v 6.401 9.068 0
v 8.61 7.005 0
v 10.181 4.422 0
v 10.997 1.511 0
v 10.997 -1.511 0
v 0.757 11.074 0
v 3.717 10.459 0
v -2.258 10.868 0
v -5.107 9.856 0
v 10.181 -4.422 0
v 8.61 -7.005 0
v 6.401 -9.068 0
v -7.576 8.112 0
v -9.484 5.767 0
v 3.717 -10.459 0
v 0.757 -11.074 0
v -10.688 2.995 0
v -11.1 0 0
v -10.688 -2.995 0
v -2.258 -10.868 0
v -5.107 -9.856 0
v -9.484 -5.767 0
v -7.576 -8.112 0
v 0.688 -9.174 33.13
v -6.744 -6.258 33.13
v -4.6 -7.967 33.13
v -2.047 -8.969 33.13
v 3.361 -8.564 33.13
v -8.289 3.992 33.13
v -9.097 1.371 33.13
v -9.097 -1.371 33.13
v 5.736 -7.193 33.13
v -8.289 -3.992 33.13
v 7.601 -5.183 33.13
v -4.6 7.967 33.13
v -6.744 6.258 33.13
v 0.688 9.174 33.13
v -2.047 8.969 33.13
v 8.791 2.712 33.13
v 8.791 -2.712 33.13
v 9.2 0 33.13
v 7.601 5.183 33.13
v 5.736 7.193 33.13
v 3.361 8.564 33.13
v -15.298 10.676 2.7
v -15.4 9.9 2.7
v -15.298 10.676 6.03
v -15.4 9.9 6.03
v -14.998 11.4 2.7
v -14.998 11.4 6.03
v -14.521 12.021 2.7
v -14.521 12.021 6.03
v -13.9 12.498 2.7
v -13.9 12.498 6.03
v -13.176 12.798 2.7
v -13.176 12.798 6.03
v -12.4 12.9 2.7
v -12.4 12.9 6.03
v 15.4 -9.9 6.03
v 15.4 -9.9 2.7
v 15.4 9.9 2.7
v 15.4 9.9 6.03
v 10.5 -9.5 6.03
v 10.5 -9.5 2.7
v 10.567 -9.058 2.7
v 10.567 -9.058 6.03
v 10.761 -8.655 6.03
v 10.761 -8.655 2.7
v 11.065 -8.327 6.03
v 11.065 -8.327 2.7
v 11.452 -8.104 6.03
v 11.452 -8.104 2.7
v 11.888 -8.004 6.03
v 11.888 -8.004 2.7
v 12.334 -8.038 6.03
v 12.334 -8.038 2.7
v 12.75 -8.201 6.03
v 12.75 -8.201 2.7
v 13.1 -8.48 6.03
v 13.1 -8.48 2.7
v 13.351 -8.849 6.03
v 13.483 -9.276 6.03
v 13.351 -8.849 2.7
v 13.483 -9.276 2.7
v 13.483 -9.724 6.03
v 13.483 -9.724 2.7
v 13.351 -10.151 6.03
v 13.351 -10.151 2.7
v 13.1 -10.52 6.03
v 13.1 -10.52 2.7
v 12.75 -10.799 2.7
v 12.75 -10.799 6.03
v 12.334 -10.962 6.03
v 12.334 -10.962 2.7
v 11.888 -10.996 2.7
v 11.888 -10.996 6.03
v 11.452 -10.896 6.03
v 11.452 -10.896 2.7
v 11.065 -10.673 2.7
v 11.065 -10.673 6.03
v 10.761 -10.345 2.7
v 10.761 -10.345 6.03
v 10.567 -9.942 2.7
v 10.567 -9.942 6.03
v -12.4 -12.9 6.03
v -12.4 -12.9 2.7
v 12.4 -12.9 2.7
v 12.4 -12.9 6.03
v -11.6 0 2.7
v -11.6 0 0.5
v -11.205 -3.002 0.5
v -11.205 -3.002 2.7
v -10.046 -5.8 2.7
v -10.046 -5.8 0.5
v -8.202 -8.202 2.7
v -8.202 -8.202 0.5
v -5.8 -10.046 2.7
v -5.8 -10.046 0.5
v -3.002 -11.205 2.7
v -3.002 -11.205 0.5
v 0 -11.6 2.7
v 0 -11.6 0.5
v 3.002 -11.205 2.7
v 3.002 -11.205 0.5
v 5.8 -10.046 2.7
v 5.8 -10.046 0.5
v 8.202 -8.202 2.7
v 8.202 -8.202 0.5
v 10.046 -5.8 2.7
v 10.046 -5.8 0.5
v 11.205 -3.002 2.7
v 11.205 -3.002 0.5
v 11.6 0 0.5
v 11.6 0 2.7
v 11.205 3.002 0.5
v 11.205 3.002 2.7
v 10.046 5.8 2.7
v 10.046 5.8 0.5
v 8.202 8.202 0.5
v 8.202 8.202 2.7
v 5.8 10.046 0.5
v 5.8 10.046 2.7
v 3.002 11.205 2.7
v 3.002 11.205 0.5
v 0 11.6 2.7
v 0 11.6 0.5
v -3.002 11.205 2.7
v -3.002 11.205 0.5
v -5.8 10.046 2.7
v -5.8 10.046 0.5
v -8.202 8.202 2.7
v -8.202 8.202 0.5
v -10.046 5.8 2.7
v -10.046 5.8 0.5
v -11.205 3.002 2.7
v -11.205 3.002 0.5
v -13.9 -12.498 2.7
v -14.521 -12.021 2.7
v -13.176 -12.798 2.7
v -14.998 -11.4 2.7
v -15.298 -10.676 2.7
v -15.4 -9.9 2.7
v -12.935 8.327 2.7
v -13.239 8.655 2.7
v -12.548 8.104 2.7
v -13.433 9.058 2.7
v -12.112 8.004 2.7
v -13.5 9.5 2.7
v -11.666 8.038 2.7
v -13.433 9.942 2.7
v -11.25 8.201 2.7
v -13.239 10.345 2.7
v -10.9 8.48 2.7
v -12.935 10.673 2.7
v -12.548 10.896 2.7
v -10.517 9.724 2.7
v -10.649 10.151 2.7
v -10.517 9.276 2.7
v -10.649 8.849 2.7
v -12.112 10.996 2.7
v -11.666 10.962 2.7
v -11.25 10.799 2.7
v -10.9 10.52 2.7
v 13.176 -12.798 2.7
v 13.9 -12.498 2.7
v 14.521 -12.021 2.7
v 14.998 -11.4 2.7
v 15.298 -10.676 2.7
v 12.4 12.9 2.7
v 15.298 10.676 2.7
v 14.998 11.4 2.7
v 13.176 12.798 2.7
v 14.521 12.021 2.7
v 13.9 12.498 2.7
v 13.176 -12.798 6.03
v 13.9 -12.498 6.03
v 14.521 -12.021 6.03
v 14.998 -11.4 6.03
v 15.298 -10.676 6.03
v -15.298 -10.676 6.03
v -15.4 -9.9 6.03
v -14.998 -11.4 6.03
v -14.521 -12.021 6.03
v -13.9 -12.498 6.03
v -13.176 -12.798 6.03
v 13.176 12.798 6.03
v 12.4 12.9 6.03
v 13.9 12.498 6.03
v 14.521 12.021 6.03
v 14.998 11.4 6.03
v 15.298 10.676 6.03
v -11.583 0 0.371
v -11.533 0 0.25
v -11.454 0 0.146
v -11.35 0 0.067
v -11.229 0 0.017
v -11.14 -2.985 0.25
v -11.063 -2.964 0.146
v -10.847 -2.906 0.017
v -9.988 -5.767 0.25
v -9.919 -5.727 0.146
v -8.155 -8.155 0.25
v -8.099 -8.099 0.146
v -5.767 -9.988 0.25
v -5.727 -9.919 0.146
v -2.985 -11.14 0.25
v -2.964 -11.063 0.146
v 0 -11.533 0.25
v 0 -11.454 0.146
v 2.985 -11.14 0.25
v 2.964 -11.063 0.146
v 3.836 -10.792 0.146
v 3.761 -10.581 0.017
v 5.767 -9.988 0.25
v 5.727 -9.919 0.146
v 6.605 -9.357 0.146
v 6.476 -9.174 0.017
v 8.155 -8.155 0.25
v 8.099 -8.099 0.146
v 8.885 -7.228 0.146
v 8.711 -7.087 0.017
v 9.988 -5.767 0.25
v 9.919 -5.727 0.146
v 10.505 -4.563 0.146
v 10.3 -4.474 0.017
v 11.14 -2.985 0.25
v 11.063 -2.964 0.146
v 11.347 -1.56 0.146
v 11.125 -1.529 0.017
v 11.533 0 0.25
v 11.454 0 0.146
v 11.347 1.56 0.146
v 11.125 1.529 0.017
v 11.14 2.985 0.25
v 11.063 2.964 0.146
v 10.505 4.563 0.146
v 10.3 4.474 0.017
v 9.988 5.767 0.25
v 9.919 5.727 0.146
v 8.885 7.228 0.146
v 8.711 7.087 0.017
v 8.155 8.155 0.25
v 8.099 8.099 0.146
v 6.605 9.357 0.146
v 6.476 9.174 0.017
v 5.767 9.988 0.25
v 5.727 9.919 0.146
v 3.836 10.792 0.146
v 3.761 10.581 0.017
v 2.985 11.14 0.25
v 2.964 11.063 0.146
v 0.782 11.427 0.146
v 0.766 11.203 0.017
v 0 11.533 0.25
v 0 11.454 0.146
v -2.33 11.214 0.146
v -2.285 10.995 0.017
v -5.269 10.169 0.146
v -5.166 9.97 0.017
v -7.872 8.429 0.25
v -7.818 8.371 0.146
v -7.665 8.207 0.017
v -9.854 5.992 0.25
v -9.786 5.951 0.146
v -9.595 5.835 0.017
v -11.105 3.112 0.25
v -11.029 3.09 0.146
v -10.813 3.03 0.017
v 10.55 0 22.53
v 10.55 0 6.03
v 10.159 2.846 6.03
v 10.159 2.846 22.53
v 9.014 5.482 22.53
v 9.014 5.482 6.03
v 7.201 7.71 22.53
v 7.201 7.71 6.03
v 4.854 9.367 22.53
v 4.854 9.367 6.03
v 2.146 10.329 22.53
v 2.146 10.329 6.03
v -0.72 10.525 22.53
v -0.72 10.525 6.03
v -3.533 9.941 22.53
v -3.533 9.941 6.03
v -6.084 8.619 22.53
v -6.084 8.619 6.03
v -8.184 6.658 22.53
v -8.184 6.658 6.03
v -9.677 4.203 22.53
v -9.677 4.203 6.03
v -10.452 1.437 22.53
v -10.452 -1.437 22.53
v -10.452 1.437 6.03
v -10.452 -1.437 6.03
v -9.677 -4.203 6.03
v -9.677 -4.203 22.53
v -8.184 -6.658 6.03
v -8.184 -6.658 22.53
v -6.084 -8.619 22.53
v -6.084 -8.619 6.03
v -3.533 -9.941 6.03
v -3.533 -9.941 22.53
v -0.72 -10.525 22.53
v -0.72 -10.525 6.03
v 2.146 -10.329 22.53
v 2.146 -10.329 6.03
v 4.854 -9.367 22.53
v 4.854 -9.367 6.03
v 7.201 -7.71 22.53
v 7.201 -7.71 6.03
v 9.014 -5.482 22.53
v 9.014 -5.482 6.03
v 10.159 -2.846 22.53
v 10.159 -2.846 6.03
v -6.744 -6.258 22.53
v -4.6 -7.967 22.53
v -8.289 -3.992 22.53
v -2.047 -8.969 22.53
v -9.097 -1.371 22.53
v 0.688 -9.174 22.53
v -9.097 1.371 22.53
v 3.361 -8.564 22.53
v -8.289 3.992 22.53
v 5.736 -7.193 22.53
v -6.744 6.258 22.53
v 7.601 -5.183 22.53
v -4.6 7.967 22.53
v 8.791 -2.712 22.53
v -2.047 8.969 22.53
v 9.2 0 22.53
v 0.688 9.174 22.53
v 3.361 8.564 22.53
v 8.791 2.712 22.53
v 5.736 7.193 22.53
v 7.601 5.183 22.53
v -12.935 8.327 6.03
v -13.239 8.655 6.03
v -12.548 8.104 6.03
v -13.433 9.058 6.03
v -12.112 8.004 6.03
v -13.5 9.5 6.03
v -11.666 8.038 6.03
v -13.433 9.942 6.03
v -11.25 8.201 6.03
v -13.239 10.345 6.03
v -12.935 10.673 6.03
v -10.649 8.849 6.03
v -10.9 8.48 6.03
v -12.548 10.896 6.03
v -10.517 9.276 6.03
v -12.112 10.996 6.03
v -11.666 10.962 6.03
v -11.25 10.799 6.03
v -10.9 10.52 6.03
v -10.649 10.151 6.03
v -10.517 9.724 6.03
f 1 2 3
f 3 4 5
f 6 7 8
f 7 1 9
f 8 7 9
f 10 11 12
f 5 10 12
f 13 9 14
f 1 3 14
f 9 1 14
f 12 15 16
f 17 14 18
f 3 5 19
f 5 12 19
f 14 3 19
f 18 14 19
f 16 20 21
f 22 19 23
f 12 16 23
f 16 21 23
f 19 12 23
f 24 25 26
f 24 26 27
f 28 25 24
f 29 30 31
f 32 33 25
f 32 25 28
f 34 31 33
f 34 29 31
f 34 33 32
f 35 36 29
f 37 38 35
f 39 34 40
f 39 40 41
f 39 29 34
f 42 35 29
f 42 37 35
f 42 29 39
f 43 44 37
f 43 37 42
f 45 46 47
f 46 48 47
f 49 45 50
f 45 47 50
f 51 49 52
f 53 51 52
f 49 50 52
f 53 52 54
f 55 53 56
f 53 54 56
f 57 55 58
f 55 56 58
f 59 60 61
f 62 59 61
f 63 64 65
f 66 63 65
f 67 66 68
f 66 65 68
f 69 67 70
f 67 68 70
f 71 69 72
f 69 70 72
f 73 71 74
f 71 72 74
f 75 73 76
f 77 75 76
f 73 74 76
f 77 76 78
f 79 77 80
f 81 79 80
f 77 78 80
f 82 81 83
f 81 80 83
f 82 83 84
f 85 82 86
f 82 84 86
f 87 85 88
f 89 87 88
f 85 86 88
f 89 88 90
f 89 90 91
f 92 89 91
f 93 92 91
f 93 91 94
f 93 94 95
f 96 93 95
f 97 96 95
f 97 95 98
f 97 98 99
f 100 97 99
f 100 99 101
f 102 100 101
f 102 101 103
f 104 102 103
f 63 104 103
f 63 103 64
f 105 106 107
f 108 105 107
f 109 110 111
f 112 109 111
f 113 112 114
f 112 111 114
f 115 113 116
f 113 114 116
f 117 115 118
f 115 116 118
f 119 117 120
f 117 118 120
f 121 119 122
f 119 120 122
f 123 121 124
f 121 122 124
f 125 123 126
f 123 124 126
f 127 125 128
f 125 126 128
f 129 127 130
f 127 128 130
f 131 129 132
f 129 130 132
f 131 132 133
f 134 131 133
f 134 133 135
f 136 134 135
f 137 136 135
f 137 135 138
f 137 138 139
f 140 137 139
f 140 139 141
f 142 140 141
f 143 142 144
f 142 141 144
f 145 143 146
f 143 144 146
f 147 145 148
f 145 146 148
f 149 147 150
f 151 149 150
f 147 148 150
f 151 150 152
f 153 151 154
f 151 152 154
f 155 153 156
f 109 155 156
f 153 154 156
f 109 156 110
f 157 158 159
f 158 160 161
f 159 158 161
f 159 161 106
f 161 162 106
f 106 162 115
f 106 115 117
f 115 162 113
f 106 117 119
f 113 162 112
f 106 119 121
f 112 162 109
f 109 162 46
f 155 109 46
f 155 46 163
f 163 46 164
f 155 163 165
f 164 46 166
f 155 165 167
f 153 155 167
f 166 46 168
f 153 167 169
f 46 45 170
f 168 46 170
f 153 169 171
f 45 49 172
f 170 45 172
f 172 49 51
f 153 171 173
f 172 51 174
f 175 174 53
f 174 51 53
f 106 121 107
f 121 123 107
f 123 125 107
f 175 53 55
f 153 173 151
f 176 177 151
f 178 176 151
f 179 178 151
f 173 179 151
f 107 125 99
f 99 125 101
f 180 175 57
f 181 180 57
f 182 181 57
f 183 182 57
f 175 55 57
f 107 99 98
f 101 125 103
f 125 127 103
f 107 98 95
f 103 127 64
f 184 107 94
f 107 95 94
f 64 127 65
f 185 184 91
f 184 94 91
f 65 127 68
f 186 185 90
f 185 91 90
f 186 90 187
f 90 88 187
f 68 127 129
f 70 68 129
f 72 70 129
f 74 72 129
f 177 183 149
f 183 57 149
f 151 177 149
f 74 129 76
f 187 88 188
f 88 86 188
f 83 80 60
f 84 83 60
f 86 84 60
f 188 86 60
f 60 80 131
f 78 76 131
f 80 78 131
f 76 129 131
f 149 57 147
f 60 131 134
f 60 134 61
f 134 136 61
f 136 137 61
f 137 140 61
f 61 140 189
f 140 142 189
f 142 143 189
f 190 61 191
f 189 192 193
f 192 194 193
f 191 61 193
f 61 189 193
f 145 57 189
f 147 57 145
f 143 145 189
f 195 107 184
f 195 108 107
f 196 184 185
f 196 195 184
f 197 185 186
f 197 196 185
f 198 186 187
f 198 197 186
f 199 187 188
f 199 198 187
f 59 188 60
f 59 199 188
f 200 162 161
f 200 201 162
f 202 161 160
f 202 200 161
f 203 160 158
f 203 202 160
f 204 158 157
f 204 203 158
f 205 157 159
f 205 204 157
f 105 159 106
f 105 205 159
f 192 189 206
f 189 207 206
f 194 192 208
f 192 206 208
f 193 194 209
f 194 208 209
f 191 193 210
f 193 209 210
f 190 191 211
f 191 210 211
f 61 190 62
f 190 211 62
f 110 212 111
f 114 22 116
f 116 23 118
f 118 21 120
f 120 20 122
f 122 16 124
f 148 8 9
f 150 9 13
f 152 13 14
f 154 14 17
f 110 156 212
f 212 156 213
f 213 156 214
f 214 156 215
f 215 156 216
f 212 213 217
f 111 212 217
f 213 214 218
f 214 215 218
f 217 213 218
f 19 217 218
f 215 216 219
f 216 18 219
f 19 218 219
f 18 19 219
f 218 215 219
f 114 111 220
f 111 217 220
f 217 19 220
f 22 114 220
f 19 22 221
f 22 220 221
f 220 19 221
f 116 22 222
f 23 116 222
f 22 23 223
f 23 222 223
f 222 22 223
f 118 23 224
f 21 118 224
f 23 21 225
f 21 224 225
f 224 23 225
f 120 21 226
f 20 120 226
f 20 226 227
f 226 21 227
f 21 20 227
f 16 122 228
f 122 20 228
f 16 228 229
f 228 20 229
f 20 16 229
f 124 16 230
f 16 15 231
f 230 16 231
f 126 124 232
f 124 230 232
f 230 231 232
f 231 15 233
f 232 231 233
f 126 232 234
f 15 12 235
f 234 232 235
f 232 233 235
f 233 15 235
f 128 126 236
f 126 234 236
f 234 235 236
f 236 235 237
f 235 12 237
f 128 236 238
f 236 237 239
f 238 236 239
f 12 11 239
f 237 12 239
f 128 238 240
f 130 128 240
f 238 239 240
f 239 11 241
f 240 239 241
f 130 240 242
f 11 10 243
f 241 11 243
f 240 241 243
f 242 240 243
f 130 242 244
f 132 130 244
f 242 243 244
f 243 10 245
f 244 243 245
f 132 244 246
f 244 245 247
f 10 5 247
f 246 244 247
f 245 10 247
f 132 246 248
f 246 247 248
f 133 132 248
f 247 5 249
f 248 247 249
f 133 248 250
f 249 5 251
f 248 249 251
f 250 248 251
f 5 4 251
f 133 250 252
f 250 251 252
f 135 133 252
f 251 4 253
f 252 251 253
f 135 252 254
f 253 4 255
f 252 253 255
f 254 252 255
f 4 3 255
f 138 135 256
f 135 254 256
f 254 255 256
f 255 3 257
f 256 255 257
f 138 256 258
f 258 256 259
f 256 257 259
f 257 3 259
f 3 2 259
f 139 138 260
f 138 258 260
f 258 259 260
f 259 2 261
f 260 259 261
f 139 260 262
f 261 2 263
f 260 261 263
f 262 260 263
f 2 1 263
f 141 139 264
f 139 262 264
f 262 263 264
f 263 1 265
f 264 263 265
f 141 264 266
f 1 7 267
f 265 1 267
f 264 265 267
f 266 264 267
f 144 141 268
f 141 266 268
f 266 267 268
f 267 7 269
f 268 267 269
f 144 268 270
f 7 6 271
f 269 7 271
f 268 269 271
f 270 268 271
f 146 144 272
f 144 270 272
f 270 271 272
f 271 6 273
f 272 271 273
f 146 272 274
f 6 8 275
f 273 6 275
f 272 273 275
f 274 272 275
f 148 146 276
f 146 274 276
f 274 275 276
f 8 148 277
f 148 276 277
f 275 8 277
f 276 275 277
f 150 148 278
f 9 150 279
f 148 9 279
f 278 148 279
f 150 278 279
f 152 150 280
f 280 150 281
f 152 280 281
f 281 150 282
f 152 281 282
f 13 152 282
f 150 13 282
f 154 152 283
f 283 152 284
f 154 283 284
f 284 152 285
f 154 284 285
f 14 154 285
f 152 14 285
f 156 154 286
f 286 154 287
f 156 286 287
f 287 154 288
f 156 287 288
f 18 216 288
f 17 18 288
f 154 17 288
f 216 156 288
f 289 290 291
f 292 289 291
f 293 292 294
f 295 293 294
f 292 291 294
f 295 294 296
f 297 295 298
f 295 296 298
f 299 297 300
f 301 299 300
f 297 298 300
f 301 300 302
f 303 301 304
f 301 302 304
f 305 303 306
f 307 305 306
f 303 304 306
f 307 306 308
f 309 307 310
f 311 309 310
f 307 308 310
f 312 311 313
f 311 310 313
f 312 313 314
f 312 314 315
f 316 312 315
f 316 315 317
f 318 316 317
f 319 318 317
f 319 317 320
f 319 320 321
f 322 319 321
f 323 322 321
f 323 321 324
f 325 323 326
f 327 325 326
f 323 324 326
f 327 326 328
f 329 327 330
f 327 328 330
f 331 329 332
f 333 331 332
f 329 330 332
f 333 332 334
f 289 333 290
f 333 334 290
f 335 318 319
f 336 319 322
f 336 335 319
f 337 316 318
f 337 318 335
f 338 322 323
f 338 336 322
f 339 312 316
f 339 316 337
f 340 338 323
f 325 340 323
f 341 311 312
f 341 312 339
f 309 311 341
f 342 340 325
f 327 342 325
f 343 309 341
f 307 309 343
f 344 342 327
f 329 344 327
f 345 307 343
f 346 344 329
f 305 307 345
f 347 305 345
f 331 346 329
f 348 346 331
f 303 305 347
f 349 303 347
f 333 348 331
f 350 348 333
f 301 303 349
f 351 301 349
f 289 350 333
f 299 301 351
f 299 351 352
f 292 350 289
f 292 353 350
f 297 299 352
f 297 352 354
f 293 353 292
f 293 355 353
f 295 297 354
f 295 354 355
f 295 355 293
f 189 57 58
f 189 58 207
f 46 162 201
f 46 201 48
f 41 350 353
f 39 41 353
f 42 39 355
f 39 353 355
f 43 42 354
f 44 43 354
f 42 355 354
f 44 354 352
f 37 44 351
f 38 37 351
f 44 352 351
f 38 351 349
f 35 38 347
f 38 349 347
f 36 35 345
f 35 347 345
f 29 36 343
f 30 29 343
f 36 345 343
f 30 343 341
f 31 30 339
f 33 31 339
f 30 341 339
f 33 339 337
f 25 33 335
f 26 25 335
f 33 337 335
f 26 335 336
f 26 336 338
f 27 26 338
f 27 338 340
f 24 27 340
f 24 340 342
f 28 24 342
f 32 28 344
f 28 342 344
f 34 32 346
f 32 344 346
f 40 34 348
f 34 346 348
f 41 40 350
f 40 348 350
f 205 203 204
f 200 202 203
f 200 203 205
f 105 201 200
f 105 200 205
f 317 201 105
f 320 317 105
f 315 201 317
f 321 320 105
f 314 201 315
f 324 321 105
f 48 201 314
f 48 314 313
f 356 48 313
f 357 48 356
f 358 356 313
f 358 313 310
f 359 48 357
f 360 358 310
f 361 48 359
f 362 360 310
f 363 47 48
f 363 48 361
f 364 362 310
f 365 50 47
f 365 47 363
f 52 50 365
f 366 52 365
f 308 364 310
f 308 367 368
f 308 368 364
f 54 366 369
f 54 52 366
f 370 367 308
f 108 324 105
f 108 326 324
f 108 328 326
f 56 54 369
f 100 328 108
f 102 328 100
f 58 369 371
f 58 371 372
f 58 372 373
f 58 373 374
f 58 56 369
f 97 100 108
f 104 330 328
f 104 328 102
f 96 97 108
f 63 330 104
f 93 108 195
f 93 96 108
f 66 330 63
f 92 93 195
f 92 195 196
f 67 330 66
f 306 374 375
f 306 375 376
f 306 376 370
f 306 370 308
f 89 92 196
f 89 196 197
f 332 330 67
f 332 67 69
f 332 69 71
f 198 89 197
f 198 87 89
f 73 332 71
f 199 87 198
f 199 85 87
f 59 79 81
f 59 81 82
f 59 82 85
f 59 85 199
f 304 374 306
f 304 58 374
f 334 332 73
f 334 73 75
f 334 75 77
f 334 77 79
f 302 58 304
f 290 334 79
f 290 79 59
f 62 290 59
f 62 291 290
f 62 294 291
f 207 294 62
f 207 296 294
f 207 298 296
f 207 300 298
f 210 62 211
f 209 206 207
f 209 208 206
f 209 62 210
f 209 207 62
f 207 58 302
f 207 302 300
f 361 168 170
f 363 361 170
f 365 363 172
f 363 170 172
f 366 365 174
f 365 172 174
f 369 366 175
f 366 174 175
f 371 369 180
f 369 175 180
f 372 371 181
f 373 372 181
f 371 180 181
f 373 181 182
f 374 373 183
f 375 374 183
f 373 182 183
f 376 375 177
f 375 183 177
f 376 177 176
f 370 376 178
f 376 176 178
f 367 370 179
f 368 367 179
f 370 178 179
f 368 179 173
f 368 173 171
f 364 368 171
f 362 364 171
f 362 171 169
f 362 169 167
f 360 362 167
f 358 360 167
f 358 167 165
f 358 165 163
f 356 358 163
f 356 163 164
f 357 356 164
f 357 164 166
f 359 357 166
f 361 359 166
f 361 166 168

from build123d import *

# Parameters (mm, degrees)
SZKIC1_R                    = 11.6
DODANIE_WYCI_GNI_CIE1_DEPTH = 2.7
ZAOKR_GLENIE1_R             = 0.5
SZKIC2_W                    = 30.8
SZKIC2_H                    = 25.8
DODANIE_WYCI_GNI_CIE2_DEPTH = 3.33
SZKIC3_R                    = 10.55
DODANIE_WYCI_GNI_CIE3_DEPTH = 16.5
SZKIC4_R                    = 9.2
DODANIE_WYCI_GNI_CIE4_DEPTH = 10.6
SZKIC5_R                    = 1.5
WYTNIJ_WYCI_GNI_CIE1_DEPTH  = 10.6
ZAOKR_GLENIE2_R             = 3


with BuildPart() as part:
    # Szkic1 → Dodanie-wyciągnięcie1 (new body)
    with BuildSketch(Plane.XY):
        with Locations(Location((0, 0, 0), (0, 0, 180))):
            Circle(SZKIC1_R)
    extrude(amount=DODANIE_WYCI_GNI_CIE1_DEPTH)

    # Zaokrąglenie1
    zaokr_glenie1_edges = [part.edges().sort_by_distance(p)[0] for p in [
        (11.6, 0, 0),
    ]]
    fillet(zaokr_glenie1_edges, radius=ZAOKR_GLENIE1_R)

    # Szkic2 → Dodanie-wyciągnięcie2 (add)
    with BuildSketch(Plane.XY.offset(2.7)):
        Rectangle(SZKIC2_W, SZKIC2_H)
    extrude(amount=DODANIE_WYCI_GNI_CIE2_DEPTH)

    # Szkic3 → Dodanie-wyciągnięcie3 (add)
    with BuildSketch(Plane.XY.offset(6.03)):
        Circle(SZKIC3_R)
    extrude(amount=DODANIE_WYCI_GNI_CIE3_DEPTH)

    # Szkic4 → Dodanie-wyciągnięcie4 (add)
    with BuildSketch(Plane.XY.offset(22.53)):
        Circle(SZKIC4_R)
    extrude(amount=DODANIE_WYCI_GNI_CIE4_DEPTH)

    # Szkic5 → Wytnij-wyciągnięcie1 (cut)
    with BuildSketch(Plane(origin=(0, 0, 2.7), x_dir=(-1, 0, 0), z_dir=(0, 0, -1))):
        with Locations((-12, -9.5)):
            Circle(SZKIC5_R)
        with Locations((12, 9.5)):
            Circle(SZKIC5_R)
    extrude(amount=-WYTNIJ_WYCI_GNI_CIE1_DEPTH, mode=Mode.SUBTRACT)

    # Zaokrąglenie2
    zaokr_glenie2_edges = [part.edges().sort_by_distance(p)[0] for p in [
        (-15.4, 12.9, 4.365),
        (-15.4, -12.9, 4.365),
        (15.4, -12.9, 4.365),
        (15.4, 12.9, 4.365),
    ]]
    fillet(zaokr_glenie2_edges, radius=ZAOKR_GLENIE2_R)


solid = part.part
